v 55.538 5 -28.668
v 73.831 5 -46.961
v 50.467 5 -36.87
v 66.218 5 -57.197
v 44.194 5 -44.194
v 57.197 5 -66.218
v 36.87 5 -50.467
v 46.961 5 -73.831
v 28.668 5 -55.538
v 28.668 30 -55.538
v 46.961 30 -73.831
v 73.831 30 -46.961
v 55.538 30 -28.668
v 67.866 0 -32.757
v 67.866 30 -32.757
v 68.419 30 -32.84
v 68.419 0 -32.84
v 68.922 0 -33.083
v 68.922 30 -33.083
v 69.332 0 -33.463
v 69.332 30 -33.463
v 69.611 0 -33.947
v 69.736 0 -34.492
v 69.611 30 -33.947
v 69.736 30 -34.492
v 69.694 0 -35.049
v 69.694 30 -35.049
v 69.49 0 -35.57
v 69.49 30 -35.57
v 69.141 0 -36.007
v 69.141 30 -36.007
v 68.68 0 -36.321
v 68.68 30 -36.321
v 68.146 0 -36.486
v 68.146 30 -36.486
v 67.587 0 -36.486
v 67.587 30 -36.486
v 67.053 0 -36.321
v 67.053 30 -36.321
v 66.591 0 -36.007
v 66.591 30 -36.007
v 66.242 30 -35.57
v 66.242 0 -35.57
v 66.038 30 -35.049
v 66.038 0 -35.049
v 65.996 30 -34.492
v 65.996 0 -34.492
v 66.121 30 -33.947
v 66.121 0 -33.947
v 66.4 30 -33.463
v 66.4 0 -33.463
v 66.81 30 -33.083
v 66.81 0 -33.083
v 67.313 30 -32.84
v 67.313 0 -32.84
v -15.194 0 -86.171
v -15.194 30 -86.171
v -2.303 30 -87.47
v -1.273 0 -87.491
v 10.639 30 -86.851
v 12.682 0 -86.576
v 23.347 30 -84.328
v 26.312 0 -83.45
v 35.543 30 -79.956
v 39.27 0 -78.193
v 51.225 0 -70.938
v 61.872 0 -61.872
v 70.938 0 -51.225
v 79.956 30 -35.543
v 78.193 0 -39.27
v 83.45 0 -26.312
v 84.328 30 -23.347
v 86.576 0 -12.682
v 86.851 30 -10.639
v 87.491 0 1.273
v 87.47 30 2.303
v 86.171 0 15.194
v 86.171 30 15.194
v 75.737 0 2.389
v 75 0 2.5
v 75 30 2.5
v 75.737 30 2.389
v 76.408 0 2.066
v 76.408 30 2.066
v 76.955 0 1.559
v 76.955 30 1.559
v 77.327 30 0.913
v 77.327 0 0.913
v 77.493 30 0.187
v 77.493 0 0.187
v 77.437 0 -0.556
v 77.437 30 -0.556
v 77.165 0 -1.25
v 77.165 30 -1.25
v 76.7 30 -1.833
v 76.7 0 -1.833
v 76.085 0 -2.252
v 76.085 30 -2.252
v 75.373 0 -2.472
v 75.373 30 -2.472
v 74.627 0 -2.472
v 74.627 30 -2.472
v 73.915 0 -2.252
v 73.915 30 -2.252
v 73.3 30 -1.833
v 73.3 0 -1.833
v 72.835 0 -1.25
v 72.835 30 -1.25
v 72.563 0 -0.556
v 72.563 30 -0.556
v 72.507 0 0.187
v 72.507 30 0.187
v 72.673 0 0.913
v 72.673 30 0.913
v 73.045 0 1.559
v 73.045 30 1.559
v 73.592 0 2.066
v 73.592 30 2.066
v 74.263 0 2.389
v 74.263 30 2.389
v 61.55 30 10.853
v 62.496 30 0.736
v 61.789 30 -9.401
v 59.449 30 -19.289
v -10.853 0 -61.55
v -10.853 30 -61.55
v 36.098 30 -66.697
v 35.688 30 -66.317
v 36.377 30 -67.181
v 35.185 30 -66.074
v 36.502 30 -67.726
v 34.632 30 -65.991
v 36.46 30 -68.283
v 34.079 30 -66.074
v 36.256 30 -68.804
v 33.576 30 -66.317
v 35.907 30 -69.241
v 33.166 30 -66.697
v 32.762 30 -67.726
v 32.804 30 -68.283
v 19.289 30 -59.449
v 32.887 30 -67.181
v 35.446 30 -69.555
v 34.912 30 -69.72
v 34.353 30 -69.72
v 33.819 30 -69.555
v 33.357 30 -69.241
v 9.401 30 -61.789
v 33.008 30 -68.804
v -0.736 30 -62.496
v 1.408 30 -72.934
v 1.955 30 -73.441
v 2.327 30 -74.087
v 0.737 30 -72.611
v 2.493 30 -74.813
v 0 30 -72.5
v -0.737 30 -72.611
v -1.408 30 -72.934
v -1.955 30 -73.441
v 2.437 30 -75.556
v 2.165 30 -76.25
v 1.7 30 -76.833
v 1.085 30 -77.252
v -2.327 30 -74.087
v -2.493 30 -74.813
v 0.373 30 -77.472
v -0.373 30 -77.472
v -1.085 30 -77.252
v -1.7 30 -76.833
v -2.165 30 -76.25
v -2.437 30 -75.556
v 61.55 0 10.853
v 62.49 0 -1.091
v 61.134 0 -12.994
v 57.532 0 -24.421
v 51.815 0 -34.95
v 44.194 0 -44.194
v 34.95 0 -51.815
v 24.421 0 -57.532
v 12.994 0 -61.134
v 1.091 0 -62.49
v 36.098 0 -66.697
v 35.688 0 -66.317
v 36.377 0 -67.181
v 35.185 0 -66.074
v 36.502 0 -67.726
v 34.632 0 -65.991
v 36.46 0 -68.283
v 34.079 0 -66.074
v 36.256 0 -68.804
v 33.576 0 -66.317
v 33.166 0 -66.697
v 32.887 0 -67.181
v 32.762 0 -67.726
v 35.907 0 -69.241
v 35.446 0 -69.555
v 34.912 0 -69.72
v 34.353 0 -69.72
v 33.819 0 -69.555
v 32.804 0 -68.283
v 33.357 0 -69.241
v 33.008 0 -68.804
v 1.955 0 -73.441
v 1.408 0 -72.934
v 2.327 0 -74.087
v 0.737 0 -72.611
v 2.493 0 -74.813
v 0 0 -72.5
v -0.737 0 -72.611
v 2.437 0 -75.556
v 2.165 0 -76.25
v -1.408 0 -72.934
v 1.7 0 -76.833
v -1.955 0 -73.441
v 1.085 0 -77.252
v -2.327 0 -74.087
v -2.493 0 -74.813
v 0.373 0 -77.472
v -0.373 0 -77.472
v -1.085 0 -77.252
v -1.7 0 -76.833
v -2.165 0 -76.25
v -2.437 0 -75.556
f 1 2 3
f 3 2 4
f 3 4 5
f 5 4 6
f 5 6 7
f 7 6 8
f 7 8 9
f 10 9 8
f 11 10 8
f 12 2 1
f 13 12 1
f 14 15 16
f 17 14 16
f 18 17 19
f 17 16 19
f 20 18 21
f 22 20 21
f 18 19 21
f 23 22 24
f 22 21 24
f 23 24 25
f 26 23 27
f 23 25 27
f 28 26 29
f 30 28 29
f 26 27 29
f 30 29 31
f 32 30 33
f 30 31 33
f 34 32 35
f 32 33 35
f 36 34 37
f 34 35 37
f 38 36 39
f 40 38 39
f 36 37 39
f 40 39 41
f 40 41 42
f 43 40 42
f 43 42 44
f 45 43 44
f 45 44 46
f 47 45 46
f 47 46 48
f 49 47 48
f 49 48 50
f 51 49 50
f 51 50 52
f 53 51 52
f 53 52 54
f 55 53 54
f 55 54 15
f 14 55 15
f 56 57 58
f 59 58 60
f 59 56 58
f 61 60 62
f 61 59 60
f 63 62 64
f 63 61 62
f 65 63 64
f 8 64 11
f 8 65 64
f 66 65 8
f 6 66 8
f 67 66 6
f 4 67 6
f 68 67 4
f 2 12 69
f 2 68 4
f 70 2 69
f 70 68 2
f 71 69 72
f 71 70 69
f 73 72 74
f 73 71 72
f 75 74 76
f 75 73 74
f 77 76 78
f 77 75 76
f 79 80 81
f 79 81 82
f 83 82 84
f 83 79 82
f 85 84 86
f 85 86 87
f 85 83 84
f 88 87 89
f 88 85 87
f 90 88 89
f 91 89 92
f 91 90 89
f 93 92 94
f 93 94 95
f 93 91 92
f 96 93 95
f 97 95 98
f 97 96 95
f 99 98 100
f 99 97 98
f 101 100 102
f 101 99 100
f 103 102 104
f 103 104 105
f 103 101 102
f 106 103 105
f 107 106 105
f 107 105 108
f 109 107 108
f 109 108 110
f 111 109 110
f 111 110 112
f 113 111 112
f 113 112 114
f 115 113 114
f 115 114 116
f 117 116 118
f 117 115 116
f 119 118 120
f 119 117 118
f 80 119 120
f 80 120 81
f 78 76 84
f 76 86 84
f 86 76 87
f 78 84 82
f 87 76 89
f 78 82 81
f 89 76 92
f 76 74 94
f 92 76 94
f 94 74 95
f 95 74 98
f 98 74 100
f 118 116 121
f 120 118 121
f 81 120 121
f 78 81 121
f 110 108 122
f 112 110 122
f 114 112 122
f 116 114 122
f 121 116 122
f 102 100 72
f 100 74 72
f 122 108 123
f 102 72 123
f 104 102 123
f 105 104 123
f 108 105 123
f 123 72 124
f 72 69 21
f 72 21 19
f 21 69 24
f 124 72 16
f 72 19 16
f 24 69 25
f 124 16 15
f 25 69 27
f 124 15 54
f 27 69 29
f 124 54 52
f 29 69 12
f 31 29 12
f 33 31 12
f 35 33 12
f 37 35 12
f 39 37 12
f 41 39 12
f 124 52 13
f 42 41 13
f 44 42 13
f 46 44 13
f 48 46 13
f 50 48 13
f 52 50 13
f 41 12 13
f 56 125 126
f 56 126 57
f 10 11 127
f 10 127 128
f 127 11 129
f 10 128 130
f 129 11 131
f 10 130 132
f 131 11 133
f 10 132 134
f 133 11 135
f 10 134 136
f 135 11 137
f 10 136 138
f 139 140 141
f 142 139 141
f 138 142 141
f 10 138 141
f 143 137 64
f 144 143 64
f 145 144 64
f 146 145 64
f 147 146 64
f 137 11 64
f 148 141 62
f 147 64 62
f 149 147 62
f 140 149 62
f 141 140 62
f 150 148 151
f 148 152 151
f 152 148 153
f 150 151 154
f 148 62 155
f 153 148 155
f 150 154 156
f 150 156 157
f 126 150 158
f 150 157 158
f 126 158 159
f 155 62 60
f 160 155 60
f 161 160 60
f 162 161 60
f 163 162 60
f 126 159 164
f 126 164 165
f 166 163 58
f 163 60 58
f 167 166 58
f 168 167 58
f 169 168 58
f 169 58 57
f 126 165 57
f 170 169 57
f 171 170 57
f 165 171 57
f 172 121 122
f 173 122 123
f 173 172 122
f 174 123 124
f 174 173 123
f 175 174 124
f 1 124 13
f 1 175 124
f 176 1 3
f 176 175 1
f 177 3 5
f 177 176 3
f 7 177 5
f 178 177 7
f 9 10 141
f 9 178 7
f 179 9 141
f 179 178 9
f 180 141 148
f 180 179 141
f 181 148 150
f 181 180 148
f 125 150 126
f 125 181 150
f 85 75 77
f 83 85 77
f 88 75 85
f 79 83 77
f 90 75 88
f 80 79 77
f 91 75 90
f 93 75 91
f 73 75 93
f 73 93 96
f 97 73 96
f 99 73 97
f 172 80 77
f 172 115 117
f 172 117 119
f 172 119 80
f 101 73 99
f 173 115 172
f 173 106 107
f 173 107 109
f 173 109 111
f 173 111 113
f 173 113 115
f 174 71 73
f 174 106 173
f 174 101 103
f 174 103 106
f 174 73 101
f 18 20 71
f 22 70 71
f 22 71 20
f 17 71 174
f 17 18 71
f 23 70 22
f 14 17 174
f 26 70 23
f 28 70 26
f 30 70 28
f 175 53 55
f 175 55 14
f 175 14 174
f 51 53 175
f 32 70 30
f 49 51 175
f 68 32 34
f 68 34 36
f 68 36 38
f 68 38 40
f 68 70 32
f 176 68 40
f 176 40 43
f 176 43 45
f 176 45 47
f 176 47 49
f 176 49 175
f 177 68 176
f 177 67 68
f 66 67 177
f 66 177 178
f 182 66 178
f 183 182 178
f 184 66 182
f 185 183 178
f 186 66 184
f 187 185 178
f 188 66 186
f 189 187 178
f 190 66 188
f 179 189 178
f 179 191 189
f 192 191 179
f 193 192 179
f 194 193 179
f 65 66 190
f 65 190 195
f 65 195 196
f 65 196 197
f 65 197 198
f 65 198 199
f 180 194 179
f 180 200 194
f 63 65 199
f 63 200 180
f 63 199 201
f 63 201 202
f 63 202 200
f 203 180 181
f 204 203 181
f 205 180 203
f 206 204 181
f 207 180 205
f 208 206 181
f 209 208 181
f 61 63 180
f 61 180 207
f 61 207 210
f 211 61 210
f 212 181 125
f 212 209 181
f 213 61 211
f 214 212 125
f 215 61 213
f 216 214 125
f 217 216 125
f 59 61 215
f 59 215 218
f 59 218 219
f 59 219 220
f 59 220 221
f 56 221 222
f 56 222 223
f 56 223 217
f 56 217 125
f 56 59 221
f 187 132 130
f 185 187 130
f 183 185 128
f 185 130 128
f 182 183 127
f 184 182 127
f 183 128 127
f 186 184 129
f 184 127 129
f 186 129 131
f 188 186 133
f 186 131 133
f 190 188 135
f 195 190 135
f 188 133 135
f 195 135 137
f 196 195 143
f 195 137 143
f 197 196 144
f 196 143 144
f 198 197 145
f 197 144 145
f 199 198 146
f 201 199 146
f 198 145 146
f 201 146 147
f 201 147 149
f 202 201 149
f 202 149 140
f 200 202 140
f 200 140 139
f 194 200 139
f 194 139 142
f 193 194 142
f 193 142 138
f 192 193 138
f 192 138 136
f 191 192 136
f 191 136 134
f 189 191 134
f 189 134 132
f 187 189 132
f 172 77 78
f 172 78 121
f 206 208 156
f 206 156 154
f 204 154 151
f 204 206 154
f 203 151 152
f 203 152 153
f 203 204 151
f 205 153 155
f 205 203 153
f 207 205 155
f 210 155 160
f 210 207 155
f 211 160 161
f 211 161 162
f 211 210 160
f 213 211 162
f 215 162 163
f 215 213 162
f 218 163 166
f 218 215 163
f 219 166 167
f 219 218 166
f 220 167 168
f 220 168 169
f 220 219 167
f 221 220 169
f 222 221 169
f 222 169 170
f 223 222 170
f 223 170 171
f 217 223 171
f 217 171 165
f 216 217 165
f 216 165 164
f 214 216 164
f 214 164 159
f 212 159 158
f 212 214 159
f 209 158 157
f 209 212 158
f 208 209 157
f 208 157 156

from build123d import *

# Parameters (mm, degrees)
SKETCH1_R           = 2.5
BOSS_EXTRUDE1_DEPTH = 30
CUT_EXTRUDE1_START  = -25
CUT_EXTRUDE1_DEPTH  = 25
SKETCH3_R           = 1.875
CUT_EXTRUDE2_DEPTH  = 128.328315782


with BuildPart() as part:
    # Sketch1 → Boss-Extrude1 (new body)
    with BuildSketch(Plane(origin=(0, 0, 0), x_dir=(1, 0, 0), z_dir=(0, 1, 0))):
        with BuildLine():
            Line((-10.853011104, 61.550484563), (-15.194215546, 86.170678389))
            ThreePointArc((-15.194215546, 86.170678389), (61.871843354, 61.871843354), (86.170678389, -15.194215546))
            Line((86.170678389, -15.194215546), (61.550484563, -10.853011104))
            ThreePointArc((61.550484563, -10.853011104), (44.194173824, 44.194173824), (-10.853011104, 61.550484563))
        make_face()
        with Locations(Location((75, 0, 0), (0, 0, 270))):
            Circle(SKETCH1_R, mode=Mode.SUBTRACT)
        with Locations(Location((0, 75, 0), (0, 0, 270))):
            Circle(SKETCH1_R, mode=Mode.SUBTRACT)
    extrude(amount=BOSS_EXTRUDE1_DEPTH)

    # Sketch2 → Cut-Extrude1 (cut)
    with BuildSketch(Plane(origin=(0, 30, 0), x_dir=(1, 0, 0), z_dir=(0, 1, 0)).offset(CUT_EXTRUDE1_START)):
        with BuildLine():
            Line((28.667524524, 55.537582209), (46.960542187, 73.830599872))
            ThreePointArc((46.960542187, 73.830599872), (61.871843354, 61.871843354), (73.830599872, 46.960542187))
            Line((73.830599872, 46.960542187), (55.537582209, 28.667524524))
            ThreePointArc((55.537582209, 28.667524524), (44.194173824, 44.194173824), (28.667524524, 55.537582209))
        make_face()
    extrude(amount=CUT_EXTRUDE1_DEPTH, mode=Mode.SUBTRACT)

    # Sketch3 → Cut-Extrude2 (cut, through all)
    with BuildSketch(Plane(origin=(0, 30, 0), x_dir=(1, 0, 0), z_dir=(0, 1, 0))):
        with Locations(Location((67.866071556, 34.63205284, 0), (0, 0, 270))):
            Circle(SKETCH3_R)
        with Locations(Location((34.63205284, 67.866071556, 0), (0, 0, 270))):
            Circle(SKETCH3_R)
    extrude(amount=-CUT_EXTRUDE2_DEPTH, mode=Mode.SUBTRACT)


solid = part.part
